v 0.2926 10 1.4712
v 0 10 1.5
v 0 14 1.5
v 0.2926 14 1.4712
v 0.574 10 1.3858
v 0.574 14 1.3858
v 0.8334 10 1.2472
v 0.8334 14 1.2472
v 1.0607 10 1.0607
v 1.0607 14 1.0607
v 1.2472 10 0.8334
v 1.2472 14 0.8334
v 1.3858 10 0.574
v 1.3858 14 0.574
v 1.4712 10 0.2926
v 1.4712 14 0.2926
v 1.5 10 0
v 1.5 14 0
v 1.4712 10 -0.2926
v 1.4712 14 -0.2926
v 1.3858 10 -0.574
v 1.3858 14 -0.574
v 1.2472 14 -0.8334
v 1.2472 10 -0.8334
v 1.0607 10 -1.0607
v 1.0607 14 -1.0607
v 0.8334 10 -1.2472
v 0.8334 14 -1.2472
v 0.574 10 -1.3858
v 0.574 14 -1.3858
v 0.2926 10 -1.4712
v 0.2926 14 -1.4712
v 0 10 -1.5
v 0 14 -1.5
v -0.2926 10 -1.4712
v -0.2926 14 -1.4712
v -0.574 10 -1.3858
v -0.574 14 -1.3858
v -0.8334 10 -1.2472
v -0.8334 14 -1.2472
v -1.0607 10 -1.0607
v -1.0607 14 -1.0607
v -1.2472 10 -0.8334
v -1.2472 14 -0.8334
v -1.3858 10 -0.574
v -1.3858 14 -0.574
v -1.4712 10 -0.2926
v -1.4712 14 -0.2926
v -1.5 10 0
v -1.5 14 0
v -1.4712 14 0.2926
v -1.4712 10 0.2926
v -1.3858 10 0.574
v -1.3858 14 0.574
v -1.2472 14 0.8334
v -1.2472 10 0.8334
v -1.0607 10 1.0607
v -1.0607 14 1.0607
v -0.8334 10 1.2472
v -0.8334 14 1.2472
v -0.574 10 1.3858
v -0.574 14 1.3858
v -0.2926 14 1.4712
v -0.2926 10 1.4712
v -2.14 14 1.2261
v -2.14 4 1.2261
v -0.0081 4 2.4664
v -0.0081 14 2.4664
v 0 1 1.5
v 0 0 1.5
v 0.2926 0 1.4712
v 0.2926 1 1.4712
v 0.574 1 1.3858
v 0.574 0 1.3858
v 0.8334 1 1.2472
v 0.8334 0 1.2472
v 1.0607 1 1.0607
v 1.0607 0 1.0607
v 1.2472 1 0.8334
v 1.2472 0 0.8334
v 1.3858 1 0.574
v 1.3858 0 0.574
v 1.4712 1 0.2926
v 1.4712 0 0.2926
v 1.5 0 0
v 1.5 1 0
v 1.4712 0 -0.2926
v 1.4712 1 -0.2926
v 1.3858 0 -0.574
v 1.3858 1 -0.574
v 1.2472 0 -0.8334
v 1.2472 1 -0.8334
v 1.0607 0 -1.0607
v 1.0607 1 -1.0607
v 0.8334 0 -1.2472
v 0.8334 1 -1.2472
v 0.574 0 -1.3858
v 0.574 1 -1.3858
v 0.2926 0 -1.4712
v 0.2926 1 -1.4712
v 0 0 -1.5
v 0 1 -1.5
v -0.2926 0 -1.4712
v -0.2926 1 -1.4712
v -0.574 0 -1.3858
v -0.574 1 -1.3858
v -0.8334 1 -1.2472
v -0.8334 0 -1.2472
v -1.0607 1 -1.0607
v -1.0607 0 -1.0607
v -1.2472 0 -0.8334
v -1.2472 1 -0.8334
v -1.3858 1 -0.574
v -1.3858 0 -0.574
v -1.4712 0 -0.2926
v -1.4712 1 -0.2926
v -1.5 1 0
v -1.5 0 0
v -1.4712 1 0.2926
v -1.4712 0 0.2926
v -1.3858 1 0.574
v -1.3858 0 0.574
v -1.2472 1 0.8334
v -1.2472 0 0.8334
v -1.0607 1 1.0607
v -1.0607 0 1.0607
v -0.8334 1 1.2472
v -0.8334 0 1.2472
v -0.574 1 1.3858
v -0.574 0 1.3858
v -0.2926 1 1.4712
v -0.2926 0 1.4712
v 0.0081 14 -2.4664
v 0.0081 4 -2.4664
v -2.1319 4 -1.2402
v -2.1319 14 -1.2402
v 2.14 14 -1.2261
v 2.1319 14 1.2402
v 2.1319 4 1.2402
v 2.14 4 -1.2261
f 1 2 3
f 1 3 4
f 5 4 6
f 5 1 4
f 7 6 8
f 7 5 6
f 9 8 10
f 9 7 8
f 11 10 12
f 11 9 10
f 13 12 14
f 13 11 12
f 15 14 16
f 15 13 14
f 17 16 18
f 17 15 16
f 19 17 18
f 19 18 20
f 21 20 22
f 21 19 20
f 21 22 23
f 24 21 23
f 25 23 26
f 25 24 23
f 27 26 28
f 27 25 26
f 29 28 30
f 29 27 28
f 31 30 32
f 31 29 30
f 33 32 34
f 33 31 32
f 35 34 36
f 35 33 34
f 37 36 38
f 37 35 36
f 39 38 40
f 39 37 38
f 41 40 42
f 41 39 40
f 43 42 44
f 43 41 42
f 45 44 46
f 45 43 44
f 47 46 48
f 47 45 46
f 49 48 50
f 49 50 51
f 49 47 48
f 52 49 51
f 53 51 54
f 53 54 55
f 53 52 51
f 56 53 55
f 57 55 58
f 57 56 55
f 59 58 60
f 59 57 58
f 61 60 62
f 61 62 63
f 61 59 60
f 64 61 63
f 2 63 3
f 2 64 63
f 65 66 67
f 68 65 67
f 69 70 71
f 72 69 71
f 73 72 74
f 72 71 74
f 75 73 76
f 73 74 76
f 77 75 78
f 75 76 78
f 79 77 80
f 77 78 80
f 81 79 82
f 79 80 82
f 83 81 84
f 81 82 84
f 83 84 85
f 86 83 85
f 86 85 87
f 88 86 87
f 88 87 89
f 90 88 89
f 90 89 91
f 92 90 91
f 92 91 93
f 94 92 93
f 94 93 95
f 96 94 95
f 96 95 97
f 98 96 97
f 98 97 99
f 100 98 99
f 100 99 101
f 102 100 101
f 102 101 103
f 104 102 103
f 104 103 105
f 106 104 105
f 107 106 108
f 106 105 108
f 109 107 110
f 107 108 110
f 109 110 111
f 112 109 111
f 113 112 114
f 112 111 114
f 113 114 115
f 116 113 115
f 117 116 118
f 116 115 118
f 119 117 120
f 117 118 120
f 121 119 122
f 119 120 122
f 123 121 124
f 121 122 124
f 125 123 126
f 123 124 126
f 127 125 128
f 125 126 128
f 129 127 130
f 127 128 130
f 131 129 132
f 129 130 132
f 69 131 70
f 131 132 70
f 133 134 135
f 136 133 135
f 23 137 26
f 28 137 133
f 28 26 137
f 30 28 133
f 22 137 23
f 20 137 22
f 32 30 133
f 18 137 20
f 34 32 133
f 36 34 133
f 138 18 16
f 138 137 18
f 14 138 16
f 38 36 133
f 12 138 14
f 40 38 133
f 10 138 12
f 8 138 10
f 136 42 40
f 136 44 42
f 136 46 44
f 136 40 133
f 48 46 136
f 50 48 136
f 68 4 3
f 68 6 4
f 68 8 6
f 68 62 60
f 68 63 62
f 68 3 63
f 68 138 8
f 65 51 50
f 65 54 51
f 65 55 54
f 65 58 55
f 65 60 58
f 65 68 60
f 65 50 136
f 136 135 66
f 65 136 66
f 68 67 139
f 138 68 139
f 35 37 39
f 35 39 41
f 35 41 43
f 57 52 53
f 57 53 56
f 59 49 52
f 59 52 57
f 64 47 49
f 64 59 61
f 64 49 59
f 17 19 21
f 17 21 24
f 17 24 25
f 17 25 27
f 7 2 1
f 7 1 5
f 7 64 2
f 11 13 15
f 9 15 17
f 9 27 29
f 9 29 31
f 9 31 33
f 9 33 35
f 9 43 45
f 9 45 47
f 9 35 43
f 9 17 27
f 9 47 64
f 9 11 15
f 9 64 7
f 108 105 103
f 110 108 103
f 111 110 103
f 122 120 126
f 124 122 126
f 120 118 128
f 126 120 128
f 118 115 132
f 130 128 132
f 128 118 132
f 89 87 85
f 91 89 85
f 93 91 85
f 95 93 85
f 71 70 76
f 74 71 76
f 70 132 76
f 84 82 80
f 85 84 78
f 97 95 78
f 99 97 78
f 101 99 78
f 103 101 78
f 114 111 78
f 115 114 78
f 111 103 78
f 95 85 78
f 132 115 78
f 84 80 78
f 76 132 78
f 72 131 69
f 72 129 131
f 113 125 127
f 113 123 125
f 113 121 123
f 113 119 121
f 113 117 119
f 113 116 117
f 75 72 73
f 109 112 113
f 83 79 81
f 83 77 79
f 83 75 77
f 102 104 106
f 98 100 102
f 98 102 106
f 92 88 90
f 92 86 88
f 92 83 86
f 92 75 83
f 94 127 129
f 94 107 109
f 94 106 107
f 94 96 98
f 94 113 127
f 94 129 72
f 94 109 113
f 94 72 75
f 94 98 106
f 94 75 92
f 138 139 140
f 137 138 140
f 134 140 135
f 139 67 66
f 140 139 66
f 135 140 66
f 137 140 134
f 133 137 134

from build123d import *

# Parameters (mm, degrees)
ESQUISSE1_R             = 1.5
BOSS_EXTRU_1_DEPTH      = 4
BOSS_EXTRU_2_DEPTH      = 10
ENL_V_START             = -4
ESQUISSE3_R             = 1.5
ENL_V_MAT_EXTRU_1_DEPTH = 4
PER_AGE1_START          = 1
PER_AGE1_OUTLINE_R      = 1.5
PER_AGE1_DEPTH          = 3


# Read off the part's stored shape, not the designer's step: Perçage1
with BuildPart() as part:
    # Esquisse1 → Boss.-Extru.1 (new body)
    with BuildSketch(Plane(origin=(0, 0, 0), x_dir=(1, 0, 0), z_dir=(0, 1, 0))):
        with Locations(Location((0, 0, 0), (0, 0, 270))):
            Circle(ESQUISSE1_R)
    extrude(amount=BOSS_EXTRU_1_DEPTH)

    # Esquisse2 → Boss.-Extru.2 (add)
    with BuildSketch(Plane(origin=(0, 4, 0), x_dir=(-1, 0, 0), z_dir=(0, 1, 0))):
        Polygon((2.131865991, -1.240236504), (2.140009315, 1.226131853), (0.008143324, 2.466368358), (-2.131865991, 1.240236504), (-2.140009315, -1.226131853), (-0.008143324, -2.466368358), align=None)
    extrude(amount=BOSS_EXTRU_2_DEPTH)

    # Esquisse3 → Enlèv. mat.-Extru.1 (cut)
    with BuildSketch(Plane(origin=(0, 14, 0), x_dir=(-1, 0, 0), z_dir=(0, 1, 0)).offset(ENL_V_START)):
        with Locations(Location((0, 0, 0), (0, 0, 90))):
            Circle(ESQUISSE3_R)
    extrude(amount=ENL_V_MAT_EXTRU_1_DEPTH, mode=Mode.SUBTRACT)

    # Perçage1 outline → Perçage1 (cut)
    with BuildSketch(Plane(origin=(0, 0, 0), x_dir=(1, 0, 0), z_dir=(0, 1, 0)).offset(PER_AGE1_START)):
        Circle(PER_AGE1_OUTLINE_R)
    extrude(amount=PER_AGE1_DEPTH, mode=Mode.SUBTRACT)


solid = part.part
